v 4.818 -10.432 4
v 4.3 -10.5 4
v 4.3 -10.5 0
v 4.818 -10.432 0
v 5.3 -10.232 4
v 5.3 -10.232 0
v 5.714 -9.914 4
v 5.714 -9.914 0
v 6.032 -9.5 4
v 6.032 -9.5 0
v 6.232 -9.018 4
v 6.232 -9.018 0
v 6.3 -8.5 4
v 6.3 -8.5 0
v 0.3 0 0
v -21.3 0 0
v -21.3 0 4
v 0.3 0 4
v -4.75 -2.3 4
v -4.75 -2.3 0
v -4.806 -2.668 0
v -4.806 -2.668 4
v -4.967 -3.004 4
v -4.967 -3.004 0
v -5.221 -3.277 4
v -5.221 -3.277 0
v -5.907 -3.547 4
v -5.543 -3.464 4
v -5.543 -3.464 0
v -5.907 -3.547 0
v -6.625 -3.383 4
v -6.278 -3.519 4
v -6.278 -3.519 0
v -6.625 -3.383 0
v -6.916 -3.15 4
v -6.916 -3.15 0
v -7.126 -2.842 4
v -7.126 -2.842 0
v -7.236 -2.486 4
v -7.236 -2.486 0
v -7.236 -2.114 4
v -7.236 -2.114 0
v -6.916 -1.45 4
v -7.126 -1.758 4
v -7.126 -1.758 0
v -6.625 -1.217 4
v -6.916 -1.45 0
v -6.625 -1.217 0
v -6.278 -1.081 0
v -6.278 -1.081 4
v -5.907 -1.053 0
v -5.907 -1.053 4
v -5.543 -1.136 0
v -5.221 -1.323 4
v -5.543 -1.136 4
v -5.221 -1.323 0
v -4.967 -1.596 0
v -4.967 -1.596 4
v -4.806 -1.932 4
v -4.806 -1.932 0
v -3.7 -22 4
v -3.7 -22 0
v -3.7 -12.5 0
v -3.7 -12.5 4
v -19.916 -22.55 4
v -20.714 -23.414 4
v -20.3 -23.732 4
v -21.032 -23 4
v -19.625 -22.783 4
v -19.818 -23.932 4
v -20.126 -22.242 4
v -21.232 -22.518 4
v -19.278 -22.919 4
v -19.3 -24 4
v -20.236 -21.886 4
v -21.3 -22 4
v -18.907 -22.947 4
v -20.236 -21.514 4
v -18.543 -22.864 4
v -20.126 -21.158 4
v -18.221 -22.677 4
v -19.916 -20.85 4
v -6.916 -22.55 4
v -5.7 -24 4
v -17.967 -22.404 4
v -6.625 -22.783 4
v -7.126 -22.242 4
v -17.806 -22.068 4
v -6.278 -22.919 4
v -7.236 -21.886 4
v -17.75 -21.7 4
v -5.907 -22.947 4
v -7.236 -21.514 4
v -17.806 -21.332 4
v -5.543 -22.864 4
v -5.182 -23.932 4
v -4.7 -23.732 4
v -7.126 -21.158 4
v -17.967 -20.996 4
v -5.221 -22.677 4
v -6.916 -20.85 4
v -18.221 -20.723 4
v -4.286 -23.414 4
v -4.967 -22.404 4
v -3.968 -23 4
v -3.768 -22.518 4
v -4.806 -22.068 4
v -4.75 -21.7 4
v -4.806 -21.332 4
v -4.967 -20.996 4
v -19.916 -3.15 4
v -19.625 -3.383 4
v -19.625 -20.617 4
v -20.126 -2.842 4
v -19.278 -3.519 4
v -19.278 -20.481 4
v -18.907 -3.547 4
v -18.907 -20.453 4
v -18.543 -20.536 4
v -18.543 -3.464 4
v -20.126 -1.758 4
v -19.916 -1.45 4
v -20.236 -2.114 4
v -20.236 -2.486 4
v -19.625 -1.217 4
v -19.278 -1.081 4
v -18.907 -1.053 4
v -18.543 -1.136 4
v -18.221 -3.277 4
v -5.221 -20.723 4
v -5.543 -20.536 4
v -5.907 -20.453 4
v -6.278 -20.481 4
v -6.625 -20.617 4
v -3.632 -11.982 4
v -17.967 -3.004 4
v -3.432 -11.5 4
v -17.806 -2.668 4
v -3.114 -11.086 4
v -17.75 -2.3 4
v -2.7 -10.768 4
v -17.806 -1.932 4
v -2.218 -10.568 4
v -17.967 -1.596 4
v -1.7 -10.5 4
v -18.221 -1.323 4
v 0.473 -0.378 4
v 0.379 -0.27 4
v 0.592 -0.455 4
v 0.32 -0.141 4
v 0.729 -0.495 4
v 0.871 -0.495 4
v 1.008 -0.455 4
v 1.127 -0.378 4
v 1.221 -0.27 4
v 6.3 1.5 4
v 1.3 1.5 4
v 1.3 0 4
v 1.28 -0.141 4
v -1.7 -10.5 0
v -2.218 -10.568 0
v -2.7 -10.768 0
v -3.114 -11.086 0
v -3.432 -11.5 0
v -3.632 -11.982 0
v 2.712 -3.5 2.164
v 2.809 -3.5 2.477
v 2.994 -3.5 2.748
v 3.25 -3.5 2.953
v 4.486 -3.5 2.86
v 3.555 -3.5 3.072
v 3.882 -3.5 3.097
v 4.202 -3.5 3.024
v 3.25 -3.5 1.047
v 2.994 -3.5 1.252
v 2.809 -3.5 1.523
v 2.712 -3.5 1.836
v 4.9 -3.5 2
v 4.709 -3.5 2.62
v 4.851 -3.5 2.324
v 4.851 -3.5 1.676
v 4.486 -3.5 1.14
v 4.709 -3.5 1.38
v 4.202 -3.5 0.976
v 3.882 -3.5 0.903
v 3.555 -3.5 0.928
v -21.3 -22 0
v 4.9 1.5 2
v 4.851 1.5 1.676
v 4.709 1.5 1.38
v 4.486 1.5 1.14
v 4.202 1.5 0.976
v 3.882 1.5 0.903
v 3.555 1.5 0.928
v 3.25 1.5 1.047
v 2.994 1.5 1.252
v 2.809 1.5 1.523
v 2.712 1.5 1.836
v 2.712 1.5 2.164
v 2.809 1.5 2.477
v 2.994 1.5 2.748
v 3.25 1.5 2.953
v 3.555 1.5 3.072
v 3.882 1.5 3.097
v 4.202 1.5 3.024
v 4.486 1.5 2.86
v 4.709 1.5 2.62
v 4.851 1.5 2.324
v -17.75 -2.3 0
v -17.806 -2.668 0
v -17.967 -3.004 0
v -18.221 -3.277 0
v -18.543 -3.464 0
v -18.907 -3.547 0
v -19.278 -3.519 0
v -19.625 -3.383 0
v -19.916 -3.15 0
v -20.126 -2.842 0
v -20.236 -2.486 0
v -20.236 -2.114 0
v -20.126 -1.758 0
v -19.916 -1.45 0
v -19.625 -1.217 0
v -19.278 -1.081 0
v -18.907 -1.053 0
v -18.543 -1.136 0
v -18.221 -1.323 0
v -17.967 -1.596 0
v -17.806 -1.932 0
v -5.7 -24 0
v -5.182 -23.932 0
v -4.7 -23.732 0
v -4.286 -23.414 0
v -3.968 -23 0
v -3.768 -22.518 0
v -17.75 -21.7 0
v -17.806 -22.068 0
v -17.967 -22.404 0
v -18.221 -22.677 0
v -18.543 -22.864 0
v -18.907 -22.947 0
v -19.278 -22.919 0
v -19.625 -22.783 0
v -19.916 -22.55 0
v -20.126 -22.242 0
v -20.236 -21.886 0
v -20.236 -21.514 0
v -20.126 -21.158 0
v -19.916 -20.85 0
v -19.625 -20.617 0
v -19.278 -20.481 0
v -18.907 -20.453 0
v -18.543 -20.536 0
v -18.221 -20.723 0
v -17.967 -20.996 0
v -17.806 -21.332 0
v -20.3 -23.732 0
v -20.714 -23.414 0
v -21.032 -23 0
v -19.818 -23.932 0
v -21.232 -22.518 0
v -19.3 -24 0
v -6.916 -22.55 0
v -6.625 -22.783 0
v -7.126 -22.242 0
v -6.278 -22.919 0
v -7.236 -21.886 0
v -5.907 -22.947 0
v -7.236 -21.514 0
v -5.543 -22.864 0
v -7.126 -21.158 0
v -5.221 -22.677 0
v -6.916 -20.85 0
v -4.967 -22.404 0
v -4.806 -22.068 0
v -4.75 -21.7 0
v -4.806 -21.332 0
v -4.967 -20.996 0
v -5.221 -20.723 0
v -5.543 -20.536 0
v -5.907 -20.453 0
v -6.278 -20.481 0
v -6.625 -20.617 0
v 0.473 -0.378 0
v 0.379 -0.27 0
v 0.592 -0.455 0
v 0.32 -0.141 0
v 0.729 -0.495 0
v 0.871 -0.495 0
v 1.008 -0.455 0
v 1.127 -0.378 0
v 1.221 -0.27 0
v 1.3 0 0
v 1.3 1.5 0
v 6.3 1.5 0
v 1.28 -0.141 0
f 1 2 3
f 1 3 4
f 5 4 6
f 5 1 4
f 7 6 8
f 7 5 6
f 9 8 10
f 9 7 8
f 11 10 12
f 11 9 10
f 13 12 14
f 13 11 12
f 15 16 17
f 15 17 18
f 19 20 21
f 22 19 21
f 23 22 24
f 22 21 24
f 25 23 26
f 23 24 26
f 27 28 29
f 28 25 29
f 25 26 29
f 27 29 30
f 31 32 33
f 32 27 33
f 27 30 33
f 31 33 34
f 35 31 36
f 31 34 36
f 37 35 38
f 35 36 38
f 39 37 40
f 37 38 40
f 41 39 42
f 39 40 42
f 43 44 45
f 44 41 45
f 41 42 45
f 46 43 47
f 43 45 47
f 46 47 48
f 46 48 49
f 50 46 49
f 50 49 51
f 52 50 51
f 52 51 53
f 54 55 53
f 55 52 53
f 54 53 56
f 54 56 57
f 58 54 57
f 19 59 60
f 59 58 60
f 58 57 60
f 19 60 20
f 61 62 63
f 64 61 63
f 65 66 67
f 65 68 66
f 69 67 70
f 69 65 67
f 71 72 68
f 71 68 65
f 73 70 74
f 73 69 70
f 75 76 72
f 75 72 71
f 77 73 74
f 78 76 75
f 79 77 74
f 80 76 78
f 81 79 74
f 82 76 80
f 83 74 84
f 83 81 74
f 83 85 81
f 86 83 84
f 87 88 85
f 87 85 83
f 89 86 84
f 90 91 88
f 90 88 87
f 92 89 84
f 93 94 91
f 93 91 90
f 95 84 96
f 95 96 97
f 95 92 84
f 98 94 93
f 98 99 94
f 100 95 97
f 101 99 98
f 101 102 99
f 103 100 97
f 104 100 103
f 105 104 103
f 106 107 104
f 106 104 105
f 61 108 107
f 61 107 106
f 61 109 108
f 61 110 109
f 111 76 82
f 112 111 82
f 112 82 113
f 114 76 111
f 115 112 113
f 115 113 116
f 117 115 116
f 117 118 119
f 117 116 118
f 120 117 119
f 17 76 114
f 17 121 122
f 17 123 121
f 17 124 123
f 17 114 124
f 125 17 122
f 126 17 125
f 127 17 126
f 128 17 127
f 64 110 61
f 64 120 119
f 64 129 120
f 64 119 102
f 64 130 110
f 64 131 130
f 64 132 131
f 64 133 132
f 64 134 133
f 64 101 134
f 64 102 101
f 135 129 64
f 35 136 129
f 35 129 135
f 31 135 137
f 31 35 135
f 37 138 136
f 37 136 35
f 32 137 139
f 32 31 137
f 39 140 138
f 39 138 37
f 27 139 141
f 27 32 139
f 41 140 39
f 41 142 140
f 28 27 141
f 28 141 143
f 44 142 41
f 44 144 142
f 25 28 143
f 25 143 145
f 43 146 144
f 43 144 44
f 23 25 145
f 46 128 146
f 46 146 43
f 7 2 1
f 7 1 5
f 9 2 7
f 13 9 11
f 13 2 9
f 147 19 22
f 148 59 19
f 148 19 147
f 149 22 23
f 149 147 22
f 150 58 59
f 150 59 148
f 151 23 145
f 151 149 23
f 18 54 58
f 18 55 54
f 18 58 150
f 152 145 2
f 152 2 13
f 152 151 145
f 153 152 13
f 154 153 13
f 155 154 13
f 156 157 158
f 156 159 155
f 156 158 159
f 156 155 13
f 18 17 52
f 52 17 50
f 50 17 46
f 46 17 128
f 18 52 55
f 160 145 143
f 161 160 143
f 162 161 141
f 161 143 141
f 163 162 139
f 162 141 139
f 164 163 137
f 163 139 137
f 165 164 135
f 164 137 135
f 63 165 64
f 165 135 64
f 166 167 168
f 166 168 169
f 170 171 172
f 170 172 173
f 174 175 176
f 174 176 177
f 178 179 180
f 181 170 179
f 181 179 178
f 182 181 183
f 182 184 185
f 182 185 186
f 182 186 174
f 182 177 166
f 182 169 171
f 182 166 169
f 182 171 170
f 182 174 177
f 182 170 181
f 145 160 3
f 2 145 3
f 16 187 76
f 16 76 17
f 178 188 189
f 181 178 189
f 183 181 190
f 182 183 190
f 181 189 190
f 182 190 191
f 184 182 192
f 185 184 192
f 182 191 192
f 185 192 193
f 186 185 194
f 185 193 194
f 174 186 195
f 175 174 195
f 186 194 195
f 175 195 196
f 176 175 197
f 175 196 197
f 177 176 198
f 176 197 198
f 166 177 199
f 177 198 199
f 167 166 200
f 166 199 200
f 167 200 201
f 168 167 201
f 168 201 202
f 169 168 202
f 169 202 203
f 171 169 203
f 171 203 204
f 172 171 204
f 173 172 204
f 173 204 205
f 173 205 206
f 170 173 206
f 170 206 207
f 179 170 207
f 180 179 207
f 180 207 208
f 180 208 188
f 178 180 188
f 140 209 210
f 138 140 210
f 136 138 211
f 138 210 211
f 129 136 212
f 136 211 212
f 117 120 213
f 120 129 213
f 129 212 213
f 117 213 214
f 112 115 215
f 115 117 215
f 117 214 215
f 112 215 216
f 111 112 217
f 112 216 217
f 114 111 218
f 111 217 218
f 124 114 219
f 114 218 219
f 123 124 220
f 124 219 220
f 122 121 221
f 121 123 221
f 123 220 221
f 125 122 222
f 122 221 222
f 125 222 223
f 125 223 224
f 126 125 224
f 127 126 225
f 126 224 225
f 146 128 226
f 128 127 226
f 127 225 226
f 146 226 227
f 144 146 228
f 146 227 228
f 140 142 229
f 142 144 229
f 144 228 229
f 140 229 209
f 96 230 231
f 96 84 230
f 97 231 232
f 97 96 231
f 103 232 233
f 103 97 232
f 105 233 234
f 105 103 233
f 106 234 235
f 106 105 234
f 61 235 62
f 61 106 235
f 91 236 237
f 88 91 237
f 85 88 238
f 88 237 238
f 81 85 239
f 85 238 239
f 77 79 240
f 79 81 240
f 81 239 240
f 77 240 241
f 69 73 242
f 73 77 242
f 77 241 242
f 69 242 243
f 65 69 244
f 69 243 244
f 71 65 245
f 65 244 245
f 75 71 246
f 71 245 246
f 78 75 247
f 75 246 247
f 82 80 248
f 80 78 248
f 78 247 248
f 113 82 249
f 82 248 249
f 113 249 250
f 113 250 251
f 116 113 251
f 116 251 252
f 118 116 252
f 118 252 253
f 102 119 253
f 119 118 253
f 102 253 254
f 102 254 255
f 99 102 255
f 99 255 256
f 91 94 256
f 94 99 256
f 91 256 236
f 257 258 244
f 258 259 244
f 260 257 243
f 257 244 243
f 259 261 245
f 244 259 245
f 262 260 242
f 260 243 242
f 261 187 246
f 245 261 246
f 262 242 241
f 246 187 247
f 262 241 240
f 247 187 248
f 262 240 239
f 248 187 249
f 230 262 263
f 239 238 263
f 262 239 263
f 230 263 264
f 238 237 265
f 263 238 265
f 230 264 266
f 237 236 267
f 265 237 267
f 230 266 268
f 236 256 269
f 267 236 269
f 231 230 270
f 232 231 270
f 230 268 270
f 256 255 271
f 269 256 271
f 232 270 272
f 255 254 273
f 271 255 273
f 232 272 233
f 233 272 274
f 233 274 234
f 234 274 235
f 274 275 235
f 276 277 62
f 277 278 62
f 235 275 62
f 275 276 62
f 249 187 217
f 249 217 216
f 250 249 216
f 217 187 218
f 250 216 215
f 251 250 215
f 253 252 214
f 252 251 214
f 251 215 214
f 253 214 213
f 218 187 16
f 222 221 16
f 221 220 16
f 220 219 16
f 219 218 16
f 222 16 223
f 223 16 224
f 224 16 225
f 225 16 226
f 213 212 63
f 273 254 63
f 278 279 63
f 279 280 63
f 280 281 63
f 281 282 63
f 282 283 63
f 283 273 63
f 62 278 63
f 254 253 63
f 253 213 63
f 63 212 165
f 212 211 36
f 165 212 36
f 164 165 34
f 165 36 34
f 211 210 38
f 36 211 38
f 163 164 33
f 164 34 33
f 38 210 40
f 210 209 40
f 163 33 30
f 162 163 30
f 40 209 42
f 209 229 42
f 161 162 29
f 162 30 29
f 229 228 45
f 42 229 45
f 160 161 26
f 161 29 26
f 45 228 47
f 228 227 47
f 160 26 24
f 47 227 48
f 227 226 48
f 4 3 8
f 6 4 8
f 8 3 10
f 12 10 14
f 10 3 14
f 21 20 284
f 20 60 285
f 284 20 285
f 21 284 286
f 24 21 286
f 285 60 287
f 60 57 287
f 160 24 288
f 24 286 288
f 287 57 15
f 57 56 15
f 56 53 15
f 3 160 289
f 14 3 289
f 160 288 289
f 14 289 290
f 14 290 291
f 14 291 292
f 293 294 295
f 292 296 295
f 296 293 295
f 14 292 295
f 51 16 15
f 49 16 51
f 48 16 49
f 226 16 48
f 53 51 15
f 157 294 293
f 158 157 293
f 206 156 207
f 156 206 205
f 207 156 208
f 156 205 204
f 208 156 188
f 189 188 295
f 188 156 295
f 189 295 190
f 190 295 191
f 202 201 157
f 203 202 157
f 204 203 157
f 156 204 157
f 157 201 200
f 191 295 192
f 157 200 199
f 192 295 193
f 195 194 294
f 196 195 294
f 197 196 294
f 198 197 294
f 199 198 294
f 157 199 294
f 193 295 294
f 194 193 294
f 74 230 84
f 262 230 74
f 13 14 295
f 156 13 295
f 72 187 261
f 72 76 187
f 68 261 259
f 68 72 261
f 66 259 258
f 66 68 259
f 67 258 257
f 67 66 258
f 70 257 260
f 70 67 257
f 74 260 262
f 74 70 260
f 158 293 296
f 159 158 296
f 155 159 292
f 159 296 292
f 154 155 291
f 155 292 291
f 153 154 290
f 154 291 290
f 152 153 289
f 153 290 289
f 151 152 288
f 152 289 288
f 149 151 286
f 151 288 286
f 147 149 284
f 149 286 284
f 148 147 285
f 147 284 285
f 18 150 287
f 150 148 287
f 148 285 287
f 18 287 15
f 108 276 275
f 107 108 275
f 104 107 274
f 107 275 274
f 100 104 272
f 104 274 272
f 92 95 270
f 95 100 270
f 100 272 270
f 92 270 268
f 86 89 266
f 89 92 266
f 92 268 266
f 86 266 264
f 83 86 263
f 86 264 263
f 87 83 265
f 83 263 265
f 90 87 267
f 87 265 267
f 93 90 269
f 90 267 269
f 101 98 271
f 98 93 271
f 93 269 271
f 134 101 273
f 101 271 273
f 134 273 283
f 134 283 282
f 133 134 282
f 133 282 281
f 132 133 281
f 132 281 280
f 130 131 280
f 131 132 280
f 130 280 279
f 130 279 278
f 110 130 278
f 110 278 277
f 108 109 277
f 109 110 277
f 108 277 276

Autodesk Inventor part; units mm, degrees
ref_plane "YZ Plane" through (0, 0, 0) normal (1, 0, 0) x (0, 1, 0)
ref_plane "XZ Plane" through (0, 0, 0) normal (0, 1, 0) x (-1, 0, 0)
ref_plane "作業平面1" through (0, 0, 0) normal (0, 0, 1) x (1, 0, 0)
sketch "スケッチ1" plane through (0, 0, 0) normal (0, 0, 1) x (1, 0, 0)
  line L0 (0, -24) -> (-27.3, -24) projected
  line L1 (-3.7, -24) -> (-3.7, -10.5)
  line L2 (-3.7, -10.5) -> (6.3, -10.5)
  line L3 (6.3, -10.5) -> (6.3, 1.5)
  line L4 (6.3, 1.5) -> (1.3, 1.5)
  line L5 (-27.3, 0) -> (0, 0) projected
  line L6 (1.3, 1.5) -> (1.3, 0)
  circle A0 centre (-6, -21.7) radius 1.25 projected
  circle A1 centre (-19, -21.7) radius 1.25 projected
  circle A2 centre (-6, -21.7) radius 2.3 construction
  circle A3 centre (-19, -21.7) radius 2.3 construction
  line L7 (1.3, 0) -> (0, 0)
  line L8 (-21.3, -24) -> (-21.3, 0)
  circle A4 centre (-6, -2.3) radius 1.25 projected
  circle A5 centre (-19, -2.3) radius 1.25 projected
  line L9 (1.3, 0) -> (0.8, 0)
  arc A6 (0.3, 0) -> (1.3, 0) centre (0.8, 0) ccw
  dimension "d0" = 1.5
  dimension "d1" = 12
  dimension "d2" = 10
  dimension "d3" = 5
  dimension "d9" = 0.5
extrude "押し出し1" add sketch "スケッチ1" along normal blind 4 contours L0 L8 L5 L7 A6 L6 L4 L3 L2 L1
sketch "スケッチ2" plane through (1.3, 1.5, 0) normal (0, 1, 0) x (1, 0, 0)
  line L0 (5, 0) -> (5, -4) projected
  line L1 (0, 0) -> (-22.6, 0) projected
  line L2 (5, -4) -> (0, 0) construction
  circle A0 centre (2.5, -2) radius 1.1
  point P0 (-1.3, 0)
  dimension "d6" = 2.2
extrude "押し出し2" cut sketch "スケッチ2" against normal blind 5
fillet "フィレット1" radius 2 4 edges at (6.3, -10.5, 2) (-3.7, -10.5, 2) (-3.7, -24, 2) (-21.3, -24, 2)
properties part number "SolenoidMount"
